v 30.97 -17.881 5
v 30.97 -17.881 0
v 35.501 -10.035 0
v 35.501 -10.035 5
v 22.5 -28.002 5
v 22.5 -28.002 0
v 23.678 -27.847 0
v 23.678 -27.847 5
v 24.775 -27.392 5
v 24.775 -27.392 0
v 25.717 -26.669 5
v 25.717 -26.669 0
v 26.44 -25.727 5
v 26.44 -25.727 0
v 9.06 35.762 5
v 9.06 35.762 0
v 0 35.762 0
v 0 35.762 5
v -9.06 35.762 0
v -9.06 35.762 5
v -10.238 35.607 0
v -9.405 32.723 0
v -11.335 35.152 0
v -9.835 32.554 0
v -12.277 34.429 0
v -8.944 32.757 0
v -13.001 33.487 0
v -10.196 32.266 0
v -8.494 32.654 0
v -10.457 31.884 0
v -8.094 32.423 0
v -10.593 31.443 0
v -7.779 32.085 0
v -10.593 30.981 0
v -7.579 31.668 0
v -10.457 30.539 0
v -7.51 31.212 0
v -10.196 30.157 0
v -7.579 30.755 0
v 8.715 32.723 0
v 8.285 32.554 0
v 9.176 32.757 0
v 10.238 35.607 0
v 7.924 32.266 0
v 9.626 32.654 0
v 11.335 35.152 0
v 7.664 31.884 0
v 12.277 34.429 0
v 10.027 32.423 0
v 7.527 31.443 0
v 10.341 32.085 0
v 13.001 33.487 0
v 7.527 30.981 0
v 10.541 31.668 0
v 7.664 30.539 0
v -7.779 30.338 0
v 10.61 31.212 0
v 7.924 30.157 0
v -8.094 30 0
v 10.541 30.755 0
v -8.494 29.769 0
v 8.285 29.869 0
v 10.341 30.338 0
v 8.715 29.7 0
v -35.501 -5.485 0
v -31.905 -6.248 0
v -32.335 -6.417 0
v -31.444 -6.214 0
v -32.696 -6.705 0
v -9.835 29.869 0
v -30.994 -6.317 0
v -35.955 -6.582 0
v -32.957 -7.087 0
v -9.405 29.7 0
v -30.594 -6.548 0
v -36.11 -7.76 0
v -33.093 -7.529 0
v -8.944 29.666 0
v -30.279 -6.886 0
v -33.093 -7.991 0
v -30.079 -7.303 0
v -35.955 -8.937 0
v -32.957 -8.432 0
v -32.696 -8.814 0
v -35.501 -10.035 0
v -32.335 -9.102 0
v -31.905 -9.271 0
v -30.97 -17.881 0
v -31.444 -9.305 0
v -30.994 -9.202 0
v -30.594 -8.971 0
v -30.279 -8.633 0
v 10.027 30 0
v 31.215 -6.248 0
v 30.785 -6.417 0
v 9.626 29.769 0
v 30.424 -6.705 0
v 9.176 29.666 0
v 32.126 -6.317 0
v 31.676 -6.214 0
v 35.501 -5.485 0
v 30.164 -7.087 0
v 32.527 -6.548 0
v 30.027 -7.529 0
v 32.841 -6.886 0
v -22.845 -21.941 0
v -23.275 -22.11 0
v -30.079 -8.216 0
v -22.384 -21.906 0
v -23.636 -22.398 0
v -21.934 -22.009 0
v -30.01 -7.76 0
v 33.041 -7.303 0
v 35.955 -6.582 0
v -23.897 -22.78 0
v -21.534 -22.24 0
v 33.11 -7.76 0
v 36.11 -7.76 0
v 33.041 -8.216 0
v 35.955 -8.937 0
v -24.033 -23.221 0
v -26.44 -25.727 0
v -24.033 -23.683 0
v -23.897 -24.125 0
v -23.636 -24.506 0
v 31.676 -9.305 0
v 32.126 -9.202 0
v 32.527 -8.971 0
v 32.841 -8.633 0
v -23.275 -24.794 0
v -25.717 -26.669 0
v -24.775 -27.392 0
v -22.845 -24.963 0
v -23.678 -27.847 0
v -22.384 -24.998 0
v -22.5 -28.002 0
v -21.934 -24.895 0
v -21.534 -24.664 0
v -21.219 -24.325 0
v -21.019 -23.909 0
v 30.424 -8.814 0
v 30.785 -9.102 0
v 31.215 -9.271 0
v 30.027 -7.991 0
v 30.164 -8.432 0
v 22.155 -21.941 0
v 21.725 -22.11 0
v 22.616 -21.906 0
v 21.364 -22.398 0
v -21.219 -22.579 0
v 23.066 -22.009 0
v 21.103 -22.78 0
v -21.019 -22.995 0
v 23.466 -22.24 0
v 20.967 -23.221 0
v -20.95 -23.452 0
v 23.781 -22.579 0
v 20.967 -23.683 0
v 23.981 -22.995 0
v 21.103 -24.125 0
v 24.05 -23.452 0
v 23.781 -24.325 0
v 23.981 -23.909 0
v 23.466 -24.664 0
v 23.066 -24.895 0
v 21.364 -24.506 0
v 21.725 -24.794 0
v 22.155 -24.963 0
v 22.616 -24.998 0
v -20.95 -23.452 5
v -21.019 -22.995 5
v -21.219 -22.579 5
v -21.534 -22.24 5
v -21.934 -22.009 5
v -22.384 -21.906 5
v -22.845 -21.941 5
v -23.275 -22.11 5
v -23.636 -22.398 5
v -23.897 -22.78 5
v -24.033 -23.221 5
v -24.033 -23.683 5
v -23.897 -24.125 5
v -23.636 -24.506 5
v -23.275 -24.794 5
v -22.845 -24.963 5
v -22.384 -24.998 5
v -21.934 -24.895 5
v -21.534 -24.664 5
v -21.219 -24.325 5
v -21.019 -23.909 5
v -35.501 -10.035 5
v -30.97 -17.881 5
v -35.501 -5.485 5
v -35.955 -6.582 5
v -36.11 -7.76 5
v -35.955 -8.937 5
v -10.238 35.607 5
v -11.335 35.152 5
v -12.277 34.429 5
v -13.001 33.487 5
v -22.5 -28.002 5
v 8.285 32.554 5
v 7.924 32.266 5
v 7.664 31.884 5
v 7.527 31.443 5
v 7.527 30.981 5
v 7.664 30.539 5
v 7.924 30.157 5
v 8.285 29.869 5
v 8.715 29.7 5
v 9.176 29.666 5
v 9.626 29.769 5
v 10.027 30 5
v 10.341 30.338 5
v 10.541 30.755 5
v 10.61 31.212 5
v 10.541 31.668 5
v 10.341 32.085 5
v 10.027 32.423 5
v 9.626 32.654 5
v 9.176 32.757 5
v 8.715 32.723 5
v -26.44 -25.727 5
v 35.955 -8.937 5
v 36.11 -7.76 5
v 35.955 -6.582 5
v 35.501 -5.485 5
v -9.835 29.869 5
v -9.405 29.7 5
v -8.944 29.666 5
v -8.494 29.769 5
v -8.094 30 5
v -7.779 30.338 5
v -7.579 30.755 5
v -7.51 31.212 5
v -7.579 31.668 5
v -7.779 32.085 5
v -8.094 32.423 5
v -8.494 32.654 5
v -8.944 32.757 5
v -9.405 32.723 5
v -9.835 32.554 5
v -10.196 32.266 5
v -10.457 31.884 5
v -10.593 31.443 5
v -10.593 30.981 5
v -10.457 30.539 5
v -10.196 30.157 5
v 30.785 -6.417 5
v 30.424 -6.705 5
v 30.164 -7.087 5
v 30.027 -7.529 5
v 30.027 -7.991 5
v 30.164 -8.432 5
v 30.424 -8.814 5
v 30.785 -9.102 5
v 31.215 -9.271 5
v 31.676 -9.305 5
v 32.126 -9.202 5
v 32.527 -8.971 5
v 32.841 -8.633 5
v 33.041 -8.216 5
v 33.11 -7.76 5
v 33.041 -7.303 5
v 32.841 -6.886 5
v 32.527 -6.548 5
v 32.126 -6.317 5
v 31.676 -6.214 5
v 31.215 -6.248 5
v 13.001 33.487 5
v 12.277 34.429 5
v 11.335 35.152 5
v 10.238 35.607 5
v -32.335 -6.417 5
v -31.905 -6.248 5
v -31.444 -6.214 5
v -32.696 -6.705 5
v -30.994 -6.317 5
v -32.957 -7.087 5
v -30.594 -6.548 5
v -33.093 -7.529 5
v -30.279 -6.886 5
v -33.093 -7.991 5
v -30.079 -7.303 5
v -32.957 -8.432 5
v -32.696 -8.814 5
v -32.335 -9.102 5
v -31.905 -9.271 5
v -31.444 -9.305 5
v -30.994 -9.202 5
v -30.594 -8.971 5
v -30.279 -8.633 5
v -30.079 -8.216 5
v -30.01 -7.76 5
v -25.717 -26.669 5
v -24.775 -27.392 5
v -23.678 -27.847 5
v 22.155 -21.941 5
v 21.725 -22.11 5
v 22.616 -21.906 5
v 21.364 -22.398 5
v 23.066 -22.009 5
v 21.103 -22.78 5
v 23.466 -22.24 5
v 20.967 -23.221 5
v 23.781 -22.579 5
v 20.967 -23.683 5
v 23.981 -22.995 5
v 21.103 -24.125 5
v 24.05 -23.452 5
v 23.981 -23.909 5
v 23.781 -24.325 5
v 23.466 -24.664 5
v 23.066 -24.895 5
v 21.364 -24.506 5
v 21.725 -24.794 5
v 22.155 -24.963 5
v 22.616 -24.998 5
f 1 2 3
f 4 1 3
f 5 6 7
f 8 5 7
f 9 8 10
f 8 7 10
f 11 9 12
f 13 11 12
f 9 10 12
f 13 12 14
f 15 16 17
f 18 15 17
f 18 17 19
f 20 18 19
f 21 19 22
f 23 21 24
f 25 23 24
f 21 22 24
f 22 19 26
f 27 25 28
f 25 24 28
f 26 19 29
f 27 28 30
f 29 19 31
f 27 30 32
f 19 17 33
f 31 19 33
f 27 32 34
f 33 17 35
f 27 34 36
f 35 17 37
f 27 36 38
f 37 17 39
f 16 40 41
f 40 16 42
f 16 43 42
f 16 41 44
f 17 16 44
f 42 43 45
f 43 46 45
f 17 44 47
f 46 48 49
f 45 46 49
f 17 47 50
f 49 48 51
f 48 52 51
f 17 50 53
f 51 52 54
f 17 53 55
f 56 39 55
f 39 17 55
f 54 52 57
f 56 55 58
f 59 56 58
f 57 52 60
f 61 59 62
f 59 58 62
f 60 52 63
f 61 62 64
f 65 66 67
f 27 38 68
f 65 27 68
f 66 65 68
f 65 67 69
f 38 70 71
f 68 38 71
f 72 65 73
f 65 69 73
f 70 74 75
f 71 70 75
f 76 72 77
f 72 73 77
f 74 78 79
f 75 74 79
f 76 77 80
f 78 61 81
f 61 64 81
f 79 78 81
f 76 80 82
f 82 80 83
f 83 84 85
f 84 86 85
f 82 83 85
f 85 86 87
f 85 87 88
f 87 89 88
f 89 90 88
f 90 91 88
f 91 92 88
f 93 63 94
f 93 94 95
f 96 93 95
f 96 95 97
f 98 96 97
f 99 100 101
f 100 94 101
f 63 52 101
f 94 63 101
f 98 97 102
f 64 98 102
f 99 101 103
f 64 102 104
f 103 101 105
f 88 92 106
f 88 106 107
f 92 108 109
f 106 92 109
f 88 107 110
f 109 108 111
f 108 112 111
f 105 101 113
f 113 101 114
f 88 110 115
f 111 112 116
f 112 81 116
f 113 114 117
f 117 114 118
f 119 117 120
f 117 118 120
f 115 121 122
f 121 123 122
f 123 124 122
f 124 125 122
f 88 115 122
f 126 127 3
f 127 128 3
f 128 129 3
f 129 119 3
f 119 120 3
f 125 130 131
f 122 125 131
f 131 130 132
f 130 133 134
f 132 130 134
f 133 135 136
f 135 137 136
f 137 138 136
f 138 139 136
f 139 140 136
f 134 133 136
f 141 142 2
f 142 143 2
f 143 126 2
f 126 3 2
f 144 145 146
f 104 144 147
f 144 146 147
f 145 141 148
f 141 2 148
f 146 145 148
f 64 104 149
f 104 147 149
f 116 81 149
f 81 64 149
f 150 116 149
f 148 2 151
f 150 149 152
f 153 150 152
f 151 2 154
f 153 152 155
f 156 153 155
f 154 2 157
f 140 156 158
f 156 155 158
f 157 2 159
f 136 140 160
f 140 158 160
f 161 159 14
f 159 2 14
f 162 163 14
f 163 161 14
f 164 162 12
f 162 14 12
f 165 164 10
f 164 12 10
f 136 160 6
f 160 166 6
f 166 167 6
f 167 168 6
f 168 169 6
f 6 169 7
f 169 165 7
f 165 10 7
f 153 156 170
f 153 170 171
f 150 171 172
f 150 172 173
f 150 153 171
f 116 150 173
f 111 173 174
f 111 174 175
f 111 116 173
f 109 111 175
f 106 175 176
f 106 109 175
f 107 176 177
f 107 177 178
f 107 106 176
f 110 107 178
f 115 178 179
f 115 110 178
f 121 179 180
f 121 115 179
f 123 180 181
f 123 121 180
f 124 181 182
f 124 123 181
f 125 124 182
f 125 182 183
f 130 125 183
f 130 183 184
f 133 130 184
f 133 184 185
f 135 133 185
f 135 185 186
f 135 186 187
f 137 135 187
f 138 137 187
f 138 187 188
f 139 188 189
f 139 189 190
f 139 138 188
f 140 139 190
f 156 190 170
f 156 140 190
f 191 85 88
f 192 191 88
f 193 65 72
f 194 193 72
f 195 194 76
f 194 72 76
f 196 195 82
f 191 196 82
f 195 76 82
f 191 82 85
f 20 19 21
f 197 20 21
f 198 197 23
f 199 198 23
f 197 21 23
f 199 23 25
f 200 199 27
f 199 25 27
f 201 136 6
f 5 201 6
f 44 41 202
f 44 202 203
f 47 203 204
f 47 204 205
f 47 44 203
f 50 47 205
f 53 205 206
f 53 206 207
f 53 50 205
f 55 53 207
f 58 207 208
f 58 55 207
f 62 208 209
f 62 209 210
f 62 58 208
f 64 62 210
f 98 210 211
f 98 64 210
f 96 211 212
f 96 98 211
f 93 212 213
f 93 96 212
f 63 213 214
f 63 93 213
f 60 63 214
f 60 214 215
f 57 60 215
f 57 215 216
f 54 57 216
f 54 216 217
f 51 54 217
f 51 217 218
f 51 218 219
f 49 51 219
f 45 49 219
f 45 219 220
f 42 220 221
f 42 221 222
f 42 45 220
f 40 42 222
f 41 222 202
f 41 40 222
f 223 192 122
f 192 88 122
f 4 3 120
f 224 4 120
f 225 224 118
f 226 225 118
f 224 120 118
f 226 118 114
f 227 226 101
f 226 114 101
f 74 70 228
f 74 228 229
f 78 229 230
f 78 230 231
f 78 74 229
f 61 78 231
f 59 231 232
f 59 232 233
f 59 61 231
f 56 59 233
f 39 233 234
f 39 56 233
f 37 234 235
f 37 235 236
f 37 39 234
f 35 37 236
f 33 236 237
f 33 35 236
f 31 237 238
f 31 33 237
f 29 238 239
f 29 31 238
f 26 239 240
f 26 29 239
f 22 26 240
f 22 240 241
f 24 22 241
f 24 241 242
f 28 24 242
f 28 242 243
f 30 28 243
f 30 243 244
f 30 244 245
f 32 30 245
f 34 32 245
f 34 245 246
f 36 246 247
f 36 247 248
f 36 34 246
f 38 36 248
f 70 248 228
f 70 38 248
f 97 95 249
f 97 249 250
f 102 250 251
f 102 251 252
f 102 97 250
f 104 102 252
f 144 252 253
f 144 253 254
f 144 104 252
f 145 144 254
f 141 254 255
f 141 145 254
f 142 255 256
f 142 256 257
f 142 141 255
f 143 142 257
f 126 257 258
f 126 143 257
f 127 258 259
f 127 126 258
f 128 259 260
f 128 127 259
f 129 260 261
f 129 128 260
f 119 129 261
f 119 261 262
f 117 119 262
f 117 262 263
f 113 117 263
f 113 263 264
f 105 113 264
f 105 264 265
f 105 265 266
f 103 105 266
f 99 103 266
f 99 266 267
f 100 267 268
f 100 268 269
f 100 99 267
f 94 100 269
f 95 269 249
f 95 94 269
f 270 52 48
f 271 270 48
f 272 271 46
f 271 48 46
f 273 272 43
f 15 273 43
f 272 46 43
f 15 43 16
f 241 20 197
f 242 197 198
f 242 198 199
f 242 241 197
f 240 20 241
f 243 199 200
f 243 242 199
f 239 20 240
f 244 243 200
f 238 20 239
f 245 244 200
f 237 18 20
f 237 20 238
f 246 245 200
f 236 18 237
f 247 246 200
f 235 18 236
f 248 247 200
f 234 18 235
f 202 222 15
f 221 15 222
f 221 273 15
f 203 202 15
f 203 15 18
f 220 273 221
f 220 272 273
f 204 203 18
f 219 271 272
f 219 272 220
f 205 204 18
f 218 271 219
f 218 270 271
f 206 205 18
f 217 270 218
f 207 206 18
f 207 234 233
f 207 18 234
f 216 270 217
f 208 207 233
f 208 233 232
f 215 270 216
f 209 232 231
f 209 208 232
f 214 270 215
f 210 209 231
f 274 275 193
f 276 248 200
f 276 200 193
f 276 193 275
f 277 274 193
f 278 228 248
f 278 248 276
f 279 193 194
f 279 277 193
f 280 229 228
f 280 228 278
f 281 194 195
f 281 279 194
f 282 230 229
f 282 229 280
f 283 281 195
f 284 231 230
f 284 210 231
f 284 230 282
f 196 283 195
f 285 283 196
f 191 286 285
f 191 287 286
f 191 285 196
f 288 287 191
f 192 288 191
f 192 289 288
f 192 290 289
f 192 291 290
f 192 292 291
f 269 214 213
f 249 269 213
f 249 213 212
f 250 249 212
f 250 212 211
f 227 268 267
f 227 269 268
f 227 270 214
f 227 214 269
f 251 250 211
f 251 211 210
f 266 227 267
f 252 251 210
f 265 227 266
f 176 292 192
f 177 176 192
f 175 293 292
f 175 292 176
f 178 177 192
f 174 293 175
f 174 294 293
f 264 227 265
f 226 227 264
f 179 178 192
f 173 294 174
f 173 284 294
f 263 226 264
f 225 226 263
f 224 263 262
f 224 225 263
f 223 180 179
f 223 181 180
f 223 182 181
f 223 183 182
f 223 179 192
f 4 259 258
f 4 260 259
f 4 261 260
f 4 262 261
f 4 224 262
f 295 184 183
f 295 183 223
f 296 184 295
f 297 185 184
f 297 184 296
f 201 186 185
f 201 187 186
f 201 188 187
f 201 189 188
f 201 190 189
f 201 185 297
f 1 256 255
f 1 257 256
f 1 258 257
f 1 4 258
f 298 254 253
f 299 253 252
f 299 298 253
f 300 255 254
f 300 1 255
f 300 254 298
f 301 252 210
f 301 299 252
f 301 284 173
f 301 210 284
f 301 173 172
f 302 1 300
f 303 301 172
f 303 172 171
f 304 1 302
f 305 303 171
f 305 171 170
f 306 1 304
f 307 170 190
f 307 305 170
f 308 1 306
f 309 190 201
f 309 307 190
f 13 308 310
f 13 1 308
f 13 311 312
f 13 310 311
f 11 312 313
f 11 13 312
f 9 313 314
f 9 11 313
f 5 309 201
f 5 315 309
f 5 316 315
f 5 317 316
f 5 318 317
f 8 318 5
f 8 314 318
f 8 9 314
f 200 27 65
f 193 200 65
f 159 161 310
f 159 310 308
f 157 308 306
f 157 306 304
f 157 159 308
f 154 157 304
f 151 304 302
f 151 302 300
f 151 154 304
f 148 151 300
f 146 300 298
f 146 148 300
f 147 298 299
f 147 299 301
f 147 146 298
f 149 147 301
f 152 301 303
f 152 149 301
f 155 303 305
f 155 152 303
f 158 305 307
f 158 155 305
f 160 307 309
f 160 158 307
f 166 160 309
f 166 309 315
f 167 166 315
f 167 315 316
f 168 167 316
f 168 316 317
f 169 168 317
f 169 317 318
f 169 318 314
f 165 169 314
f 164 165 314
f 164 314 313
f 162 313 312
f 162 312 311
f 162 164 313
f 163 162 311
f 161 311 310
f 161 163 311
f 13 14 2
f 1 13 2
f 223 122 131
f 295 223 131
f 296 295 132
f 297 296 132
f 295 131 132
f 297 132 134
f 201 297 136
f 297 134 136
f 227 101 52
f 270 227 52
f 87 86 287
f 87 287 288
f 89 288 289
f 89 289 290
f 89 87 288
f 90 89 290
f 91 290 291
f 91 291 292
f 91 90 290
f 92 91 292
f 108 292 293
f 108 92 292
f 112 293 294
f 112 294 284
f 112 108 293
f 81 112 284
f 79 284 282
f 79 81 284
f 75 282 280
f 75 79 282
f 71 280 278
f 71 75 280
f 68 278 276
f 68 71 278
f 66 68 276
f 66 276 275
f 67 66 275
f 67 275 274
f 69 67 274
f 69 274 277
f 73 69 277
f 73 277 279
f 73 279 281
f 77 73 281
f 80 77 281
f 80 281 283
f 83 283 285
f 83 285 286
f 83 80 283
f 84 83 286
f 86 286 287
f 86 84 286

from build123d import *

# Parameters (mm, degrees)
F0_R     = 1.55
F1_DEPTH = 5
F2_COUNT = 3
F2_ANGLE = 240


with BuildPart() as f1:
    # F0 (on Top) → F1 (new body)
    with BuildSketch(Plane.XY):
        with BuildLine():
            ThreePointArc((-26.440416, -25.727079), (-24.775, -27.392494), (-22.5, -28.002079))
            Line((-22.5, -28.002079), (22.5, -28.002079))
            ThreePointArc((22.5, -28.002079), (24.775, -27.392494), (26.440416, -25.727079))
            Line((26.440416, -25.727079), (30.970464, -17.880805))
            Line((30.970464, -17.880805), (0, 0))
            Line((0, 0), (-30.970464, -17.880805))
            Line((-30.970464, -17.880805), (-26.440416, -25.727079))
        make_face()
        with Locations((-22.5, -23.452079)):
            Circle(F0_R, mode=Mode.SUBTRACT)
        with Locations((22.5, -23.452079)):
            Circle(F0_R, mode=Mode.SUBTRACT)
    extrude(amount=F1_DEPTH)

    # F2: F1 ×3 about axis
    f2_axis = Axis((0, 0, 2.5), (0, 0, 1))


with BuildPart() as f1_1:
    add(f1.part)
    for i in range(1, F2_COUNT):
        add(f1.part.rotate(f2_axis, i * F2_ANGLE / (F2_COUNT - 1)))


solid = f1_1.part
